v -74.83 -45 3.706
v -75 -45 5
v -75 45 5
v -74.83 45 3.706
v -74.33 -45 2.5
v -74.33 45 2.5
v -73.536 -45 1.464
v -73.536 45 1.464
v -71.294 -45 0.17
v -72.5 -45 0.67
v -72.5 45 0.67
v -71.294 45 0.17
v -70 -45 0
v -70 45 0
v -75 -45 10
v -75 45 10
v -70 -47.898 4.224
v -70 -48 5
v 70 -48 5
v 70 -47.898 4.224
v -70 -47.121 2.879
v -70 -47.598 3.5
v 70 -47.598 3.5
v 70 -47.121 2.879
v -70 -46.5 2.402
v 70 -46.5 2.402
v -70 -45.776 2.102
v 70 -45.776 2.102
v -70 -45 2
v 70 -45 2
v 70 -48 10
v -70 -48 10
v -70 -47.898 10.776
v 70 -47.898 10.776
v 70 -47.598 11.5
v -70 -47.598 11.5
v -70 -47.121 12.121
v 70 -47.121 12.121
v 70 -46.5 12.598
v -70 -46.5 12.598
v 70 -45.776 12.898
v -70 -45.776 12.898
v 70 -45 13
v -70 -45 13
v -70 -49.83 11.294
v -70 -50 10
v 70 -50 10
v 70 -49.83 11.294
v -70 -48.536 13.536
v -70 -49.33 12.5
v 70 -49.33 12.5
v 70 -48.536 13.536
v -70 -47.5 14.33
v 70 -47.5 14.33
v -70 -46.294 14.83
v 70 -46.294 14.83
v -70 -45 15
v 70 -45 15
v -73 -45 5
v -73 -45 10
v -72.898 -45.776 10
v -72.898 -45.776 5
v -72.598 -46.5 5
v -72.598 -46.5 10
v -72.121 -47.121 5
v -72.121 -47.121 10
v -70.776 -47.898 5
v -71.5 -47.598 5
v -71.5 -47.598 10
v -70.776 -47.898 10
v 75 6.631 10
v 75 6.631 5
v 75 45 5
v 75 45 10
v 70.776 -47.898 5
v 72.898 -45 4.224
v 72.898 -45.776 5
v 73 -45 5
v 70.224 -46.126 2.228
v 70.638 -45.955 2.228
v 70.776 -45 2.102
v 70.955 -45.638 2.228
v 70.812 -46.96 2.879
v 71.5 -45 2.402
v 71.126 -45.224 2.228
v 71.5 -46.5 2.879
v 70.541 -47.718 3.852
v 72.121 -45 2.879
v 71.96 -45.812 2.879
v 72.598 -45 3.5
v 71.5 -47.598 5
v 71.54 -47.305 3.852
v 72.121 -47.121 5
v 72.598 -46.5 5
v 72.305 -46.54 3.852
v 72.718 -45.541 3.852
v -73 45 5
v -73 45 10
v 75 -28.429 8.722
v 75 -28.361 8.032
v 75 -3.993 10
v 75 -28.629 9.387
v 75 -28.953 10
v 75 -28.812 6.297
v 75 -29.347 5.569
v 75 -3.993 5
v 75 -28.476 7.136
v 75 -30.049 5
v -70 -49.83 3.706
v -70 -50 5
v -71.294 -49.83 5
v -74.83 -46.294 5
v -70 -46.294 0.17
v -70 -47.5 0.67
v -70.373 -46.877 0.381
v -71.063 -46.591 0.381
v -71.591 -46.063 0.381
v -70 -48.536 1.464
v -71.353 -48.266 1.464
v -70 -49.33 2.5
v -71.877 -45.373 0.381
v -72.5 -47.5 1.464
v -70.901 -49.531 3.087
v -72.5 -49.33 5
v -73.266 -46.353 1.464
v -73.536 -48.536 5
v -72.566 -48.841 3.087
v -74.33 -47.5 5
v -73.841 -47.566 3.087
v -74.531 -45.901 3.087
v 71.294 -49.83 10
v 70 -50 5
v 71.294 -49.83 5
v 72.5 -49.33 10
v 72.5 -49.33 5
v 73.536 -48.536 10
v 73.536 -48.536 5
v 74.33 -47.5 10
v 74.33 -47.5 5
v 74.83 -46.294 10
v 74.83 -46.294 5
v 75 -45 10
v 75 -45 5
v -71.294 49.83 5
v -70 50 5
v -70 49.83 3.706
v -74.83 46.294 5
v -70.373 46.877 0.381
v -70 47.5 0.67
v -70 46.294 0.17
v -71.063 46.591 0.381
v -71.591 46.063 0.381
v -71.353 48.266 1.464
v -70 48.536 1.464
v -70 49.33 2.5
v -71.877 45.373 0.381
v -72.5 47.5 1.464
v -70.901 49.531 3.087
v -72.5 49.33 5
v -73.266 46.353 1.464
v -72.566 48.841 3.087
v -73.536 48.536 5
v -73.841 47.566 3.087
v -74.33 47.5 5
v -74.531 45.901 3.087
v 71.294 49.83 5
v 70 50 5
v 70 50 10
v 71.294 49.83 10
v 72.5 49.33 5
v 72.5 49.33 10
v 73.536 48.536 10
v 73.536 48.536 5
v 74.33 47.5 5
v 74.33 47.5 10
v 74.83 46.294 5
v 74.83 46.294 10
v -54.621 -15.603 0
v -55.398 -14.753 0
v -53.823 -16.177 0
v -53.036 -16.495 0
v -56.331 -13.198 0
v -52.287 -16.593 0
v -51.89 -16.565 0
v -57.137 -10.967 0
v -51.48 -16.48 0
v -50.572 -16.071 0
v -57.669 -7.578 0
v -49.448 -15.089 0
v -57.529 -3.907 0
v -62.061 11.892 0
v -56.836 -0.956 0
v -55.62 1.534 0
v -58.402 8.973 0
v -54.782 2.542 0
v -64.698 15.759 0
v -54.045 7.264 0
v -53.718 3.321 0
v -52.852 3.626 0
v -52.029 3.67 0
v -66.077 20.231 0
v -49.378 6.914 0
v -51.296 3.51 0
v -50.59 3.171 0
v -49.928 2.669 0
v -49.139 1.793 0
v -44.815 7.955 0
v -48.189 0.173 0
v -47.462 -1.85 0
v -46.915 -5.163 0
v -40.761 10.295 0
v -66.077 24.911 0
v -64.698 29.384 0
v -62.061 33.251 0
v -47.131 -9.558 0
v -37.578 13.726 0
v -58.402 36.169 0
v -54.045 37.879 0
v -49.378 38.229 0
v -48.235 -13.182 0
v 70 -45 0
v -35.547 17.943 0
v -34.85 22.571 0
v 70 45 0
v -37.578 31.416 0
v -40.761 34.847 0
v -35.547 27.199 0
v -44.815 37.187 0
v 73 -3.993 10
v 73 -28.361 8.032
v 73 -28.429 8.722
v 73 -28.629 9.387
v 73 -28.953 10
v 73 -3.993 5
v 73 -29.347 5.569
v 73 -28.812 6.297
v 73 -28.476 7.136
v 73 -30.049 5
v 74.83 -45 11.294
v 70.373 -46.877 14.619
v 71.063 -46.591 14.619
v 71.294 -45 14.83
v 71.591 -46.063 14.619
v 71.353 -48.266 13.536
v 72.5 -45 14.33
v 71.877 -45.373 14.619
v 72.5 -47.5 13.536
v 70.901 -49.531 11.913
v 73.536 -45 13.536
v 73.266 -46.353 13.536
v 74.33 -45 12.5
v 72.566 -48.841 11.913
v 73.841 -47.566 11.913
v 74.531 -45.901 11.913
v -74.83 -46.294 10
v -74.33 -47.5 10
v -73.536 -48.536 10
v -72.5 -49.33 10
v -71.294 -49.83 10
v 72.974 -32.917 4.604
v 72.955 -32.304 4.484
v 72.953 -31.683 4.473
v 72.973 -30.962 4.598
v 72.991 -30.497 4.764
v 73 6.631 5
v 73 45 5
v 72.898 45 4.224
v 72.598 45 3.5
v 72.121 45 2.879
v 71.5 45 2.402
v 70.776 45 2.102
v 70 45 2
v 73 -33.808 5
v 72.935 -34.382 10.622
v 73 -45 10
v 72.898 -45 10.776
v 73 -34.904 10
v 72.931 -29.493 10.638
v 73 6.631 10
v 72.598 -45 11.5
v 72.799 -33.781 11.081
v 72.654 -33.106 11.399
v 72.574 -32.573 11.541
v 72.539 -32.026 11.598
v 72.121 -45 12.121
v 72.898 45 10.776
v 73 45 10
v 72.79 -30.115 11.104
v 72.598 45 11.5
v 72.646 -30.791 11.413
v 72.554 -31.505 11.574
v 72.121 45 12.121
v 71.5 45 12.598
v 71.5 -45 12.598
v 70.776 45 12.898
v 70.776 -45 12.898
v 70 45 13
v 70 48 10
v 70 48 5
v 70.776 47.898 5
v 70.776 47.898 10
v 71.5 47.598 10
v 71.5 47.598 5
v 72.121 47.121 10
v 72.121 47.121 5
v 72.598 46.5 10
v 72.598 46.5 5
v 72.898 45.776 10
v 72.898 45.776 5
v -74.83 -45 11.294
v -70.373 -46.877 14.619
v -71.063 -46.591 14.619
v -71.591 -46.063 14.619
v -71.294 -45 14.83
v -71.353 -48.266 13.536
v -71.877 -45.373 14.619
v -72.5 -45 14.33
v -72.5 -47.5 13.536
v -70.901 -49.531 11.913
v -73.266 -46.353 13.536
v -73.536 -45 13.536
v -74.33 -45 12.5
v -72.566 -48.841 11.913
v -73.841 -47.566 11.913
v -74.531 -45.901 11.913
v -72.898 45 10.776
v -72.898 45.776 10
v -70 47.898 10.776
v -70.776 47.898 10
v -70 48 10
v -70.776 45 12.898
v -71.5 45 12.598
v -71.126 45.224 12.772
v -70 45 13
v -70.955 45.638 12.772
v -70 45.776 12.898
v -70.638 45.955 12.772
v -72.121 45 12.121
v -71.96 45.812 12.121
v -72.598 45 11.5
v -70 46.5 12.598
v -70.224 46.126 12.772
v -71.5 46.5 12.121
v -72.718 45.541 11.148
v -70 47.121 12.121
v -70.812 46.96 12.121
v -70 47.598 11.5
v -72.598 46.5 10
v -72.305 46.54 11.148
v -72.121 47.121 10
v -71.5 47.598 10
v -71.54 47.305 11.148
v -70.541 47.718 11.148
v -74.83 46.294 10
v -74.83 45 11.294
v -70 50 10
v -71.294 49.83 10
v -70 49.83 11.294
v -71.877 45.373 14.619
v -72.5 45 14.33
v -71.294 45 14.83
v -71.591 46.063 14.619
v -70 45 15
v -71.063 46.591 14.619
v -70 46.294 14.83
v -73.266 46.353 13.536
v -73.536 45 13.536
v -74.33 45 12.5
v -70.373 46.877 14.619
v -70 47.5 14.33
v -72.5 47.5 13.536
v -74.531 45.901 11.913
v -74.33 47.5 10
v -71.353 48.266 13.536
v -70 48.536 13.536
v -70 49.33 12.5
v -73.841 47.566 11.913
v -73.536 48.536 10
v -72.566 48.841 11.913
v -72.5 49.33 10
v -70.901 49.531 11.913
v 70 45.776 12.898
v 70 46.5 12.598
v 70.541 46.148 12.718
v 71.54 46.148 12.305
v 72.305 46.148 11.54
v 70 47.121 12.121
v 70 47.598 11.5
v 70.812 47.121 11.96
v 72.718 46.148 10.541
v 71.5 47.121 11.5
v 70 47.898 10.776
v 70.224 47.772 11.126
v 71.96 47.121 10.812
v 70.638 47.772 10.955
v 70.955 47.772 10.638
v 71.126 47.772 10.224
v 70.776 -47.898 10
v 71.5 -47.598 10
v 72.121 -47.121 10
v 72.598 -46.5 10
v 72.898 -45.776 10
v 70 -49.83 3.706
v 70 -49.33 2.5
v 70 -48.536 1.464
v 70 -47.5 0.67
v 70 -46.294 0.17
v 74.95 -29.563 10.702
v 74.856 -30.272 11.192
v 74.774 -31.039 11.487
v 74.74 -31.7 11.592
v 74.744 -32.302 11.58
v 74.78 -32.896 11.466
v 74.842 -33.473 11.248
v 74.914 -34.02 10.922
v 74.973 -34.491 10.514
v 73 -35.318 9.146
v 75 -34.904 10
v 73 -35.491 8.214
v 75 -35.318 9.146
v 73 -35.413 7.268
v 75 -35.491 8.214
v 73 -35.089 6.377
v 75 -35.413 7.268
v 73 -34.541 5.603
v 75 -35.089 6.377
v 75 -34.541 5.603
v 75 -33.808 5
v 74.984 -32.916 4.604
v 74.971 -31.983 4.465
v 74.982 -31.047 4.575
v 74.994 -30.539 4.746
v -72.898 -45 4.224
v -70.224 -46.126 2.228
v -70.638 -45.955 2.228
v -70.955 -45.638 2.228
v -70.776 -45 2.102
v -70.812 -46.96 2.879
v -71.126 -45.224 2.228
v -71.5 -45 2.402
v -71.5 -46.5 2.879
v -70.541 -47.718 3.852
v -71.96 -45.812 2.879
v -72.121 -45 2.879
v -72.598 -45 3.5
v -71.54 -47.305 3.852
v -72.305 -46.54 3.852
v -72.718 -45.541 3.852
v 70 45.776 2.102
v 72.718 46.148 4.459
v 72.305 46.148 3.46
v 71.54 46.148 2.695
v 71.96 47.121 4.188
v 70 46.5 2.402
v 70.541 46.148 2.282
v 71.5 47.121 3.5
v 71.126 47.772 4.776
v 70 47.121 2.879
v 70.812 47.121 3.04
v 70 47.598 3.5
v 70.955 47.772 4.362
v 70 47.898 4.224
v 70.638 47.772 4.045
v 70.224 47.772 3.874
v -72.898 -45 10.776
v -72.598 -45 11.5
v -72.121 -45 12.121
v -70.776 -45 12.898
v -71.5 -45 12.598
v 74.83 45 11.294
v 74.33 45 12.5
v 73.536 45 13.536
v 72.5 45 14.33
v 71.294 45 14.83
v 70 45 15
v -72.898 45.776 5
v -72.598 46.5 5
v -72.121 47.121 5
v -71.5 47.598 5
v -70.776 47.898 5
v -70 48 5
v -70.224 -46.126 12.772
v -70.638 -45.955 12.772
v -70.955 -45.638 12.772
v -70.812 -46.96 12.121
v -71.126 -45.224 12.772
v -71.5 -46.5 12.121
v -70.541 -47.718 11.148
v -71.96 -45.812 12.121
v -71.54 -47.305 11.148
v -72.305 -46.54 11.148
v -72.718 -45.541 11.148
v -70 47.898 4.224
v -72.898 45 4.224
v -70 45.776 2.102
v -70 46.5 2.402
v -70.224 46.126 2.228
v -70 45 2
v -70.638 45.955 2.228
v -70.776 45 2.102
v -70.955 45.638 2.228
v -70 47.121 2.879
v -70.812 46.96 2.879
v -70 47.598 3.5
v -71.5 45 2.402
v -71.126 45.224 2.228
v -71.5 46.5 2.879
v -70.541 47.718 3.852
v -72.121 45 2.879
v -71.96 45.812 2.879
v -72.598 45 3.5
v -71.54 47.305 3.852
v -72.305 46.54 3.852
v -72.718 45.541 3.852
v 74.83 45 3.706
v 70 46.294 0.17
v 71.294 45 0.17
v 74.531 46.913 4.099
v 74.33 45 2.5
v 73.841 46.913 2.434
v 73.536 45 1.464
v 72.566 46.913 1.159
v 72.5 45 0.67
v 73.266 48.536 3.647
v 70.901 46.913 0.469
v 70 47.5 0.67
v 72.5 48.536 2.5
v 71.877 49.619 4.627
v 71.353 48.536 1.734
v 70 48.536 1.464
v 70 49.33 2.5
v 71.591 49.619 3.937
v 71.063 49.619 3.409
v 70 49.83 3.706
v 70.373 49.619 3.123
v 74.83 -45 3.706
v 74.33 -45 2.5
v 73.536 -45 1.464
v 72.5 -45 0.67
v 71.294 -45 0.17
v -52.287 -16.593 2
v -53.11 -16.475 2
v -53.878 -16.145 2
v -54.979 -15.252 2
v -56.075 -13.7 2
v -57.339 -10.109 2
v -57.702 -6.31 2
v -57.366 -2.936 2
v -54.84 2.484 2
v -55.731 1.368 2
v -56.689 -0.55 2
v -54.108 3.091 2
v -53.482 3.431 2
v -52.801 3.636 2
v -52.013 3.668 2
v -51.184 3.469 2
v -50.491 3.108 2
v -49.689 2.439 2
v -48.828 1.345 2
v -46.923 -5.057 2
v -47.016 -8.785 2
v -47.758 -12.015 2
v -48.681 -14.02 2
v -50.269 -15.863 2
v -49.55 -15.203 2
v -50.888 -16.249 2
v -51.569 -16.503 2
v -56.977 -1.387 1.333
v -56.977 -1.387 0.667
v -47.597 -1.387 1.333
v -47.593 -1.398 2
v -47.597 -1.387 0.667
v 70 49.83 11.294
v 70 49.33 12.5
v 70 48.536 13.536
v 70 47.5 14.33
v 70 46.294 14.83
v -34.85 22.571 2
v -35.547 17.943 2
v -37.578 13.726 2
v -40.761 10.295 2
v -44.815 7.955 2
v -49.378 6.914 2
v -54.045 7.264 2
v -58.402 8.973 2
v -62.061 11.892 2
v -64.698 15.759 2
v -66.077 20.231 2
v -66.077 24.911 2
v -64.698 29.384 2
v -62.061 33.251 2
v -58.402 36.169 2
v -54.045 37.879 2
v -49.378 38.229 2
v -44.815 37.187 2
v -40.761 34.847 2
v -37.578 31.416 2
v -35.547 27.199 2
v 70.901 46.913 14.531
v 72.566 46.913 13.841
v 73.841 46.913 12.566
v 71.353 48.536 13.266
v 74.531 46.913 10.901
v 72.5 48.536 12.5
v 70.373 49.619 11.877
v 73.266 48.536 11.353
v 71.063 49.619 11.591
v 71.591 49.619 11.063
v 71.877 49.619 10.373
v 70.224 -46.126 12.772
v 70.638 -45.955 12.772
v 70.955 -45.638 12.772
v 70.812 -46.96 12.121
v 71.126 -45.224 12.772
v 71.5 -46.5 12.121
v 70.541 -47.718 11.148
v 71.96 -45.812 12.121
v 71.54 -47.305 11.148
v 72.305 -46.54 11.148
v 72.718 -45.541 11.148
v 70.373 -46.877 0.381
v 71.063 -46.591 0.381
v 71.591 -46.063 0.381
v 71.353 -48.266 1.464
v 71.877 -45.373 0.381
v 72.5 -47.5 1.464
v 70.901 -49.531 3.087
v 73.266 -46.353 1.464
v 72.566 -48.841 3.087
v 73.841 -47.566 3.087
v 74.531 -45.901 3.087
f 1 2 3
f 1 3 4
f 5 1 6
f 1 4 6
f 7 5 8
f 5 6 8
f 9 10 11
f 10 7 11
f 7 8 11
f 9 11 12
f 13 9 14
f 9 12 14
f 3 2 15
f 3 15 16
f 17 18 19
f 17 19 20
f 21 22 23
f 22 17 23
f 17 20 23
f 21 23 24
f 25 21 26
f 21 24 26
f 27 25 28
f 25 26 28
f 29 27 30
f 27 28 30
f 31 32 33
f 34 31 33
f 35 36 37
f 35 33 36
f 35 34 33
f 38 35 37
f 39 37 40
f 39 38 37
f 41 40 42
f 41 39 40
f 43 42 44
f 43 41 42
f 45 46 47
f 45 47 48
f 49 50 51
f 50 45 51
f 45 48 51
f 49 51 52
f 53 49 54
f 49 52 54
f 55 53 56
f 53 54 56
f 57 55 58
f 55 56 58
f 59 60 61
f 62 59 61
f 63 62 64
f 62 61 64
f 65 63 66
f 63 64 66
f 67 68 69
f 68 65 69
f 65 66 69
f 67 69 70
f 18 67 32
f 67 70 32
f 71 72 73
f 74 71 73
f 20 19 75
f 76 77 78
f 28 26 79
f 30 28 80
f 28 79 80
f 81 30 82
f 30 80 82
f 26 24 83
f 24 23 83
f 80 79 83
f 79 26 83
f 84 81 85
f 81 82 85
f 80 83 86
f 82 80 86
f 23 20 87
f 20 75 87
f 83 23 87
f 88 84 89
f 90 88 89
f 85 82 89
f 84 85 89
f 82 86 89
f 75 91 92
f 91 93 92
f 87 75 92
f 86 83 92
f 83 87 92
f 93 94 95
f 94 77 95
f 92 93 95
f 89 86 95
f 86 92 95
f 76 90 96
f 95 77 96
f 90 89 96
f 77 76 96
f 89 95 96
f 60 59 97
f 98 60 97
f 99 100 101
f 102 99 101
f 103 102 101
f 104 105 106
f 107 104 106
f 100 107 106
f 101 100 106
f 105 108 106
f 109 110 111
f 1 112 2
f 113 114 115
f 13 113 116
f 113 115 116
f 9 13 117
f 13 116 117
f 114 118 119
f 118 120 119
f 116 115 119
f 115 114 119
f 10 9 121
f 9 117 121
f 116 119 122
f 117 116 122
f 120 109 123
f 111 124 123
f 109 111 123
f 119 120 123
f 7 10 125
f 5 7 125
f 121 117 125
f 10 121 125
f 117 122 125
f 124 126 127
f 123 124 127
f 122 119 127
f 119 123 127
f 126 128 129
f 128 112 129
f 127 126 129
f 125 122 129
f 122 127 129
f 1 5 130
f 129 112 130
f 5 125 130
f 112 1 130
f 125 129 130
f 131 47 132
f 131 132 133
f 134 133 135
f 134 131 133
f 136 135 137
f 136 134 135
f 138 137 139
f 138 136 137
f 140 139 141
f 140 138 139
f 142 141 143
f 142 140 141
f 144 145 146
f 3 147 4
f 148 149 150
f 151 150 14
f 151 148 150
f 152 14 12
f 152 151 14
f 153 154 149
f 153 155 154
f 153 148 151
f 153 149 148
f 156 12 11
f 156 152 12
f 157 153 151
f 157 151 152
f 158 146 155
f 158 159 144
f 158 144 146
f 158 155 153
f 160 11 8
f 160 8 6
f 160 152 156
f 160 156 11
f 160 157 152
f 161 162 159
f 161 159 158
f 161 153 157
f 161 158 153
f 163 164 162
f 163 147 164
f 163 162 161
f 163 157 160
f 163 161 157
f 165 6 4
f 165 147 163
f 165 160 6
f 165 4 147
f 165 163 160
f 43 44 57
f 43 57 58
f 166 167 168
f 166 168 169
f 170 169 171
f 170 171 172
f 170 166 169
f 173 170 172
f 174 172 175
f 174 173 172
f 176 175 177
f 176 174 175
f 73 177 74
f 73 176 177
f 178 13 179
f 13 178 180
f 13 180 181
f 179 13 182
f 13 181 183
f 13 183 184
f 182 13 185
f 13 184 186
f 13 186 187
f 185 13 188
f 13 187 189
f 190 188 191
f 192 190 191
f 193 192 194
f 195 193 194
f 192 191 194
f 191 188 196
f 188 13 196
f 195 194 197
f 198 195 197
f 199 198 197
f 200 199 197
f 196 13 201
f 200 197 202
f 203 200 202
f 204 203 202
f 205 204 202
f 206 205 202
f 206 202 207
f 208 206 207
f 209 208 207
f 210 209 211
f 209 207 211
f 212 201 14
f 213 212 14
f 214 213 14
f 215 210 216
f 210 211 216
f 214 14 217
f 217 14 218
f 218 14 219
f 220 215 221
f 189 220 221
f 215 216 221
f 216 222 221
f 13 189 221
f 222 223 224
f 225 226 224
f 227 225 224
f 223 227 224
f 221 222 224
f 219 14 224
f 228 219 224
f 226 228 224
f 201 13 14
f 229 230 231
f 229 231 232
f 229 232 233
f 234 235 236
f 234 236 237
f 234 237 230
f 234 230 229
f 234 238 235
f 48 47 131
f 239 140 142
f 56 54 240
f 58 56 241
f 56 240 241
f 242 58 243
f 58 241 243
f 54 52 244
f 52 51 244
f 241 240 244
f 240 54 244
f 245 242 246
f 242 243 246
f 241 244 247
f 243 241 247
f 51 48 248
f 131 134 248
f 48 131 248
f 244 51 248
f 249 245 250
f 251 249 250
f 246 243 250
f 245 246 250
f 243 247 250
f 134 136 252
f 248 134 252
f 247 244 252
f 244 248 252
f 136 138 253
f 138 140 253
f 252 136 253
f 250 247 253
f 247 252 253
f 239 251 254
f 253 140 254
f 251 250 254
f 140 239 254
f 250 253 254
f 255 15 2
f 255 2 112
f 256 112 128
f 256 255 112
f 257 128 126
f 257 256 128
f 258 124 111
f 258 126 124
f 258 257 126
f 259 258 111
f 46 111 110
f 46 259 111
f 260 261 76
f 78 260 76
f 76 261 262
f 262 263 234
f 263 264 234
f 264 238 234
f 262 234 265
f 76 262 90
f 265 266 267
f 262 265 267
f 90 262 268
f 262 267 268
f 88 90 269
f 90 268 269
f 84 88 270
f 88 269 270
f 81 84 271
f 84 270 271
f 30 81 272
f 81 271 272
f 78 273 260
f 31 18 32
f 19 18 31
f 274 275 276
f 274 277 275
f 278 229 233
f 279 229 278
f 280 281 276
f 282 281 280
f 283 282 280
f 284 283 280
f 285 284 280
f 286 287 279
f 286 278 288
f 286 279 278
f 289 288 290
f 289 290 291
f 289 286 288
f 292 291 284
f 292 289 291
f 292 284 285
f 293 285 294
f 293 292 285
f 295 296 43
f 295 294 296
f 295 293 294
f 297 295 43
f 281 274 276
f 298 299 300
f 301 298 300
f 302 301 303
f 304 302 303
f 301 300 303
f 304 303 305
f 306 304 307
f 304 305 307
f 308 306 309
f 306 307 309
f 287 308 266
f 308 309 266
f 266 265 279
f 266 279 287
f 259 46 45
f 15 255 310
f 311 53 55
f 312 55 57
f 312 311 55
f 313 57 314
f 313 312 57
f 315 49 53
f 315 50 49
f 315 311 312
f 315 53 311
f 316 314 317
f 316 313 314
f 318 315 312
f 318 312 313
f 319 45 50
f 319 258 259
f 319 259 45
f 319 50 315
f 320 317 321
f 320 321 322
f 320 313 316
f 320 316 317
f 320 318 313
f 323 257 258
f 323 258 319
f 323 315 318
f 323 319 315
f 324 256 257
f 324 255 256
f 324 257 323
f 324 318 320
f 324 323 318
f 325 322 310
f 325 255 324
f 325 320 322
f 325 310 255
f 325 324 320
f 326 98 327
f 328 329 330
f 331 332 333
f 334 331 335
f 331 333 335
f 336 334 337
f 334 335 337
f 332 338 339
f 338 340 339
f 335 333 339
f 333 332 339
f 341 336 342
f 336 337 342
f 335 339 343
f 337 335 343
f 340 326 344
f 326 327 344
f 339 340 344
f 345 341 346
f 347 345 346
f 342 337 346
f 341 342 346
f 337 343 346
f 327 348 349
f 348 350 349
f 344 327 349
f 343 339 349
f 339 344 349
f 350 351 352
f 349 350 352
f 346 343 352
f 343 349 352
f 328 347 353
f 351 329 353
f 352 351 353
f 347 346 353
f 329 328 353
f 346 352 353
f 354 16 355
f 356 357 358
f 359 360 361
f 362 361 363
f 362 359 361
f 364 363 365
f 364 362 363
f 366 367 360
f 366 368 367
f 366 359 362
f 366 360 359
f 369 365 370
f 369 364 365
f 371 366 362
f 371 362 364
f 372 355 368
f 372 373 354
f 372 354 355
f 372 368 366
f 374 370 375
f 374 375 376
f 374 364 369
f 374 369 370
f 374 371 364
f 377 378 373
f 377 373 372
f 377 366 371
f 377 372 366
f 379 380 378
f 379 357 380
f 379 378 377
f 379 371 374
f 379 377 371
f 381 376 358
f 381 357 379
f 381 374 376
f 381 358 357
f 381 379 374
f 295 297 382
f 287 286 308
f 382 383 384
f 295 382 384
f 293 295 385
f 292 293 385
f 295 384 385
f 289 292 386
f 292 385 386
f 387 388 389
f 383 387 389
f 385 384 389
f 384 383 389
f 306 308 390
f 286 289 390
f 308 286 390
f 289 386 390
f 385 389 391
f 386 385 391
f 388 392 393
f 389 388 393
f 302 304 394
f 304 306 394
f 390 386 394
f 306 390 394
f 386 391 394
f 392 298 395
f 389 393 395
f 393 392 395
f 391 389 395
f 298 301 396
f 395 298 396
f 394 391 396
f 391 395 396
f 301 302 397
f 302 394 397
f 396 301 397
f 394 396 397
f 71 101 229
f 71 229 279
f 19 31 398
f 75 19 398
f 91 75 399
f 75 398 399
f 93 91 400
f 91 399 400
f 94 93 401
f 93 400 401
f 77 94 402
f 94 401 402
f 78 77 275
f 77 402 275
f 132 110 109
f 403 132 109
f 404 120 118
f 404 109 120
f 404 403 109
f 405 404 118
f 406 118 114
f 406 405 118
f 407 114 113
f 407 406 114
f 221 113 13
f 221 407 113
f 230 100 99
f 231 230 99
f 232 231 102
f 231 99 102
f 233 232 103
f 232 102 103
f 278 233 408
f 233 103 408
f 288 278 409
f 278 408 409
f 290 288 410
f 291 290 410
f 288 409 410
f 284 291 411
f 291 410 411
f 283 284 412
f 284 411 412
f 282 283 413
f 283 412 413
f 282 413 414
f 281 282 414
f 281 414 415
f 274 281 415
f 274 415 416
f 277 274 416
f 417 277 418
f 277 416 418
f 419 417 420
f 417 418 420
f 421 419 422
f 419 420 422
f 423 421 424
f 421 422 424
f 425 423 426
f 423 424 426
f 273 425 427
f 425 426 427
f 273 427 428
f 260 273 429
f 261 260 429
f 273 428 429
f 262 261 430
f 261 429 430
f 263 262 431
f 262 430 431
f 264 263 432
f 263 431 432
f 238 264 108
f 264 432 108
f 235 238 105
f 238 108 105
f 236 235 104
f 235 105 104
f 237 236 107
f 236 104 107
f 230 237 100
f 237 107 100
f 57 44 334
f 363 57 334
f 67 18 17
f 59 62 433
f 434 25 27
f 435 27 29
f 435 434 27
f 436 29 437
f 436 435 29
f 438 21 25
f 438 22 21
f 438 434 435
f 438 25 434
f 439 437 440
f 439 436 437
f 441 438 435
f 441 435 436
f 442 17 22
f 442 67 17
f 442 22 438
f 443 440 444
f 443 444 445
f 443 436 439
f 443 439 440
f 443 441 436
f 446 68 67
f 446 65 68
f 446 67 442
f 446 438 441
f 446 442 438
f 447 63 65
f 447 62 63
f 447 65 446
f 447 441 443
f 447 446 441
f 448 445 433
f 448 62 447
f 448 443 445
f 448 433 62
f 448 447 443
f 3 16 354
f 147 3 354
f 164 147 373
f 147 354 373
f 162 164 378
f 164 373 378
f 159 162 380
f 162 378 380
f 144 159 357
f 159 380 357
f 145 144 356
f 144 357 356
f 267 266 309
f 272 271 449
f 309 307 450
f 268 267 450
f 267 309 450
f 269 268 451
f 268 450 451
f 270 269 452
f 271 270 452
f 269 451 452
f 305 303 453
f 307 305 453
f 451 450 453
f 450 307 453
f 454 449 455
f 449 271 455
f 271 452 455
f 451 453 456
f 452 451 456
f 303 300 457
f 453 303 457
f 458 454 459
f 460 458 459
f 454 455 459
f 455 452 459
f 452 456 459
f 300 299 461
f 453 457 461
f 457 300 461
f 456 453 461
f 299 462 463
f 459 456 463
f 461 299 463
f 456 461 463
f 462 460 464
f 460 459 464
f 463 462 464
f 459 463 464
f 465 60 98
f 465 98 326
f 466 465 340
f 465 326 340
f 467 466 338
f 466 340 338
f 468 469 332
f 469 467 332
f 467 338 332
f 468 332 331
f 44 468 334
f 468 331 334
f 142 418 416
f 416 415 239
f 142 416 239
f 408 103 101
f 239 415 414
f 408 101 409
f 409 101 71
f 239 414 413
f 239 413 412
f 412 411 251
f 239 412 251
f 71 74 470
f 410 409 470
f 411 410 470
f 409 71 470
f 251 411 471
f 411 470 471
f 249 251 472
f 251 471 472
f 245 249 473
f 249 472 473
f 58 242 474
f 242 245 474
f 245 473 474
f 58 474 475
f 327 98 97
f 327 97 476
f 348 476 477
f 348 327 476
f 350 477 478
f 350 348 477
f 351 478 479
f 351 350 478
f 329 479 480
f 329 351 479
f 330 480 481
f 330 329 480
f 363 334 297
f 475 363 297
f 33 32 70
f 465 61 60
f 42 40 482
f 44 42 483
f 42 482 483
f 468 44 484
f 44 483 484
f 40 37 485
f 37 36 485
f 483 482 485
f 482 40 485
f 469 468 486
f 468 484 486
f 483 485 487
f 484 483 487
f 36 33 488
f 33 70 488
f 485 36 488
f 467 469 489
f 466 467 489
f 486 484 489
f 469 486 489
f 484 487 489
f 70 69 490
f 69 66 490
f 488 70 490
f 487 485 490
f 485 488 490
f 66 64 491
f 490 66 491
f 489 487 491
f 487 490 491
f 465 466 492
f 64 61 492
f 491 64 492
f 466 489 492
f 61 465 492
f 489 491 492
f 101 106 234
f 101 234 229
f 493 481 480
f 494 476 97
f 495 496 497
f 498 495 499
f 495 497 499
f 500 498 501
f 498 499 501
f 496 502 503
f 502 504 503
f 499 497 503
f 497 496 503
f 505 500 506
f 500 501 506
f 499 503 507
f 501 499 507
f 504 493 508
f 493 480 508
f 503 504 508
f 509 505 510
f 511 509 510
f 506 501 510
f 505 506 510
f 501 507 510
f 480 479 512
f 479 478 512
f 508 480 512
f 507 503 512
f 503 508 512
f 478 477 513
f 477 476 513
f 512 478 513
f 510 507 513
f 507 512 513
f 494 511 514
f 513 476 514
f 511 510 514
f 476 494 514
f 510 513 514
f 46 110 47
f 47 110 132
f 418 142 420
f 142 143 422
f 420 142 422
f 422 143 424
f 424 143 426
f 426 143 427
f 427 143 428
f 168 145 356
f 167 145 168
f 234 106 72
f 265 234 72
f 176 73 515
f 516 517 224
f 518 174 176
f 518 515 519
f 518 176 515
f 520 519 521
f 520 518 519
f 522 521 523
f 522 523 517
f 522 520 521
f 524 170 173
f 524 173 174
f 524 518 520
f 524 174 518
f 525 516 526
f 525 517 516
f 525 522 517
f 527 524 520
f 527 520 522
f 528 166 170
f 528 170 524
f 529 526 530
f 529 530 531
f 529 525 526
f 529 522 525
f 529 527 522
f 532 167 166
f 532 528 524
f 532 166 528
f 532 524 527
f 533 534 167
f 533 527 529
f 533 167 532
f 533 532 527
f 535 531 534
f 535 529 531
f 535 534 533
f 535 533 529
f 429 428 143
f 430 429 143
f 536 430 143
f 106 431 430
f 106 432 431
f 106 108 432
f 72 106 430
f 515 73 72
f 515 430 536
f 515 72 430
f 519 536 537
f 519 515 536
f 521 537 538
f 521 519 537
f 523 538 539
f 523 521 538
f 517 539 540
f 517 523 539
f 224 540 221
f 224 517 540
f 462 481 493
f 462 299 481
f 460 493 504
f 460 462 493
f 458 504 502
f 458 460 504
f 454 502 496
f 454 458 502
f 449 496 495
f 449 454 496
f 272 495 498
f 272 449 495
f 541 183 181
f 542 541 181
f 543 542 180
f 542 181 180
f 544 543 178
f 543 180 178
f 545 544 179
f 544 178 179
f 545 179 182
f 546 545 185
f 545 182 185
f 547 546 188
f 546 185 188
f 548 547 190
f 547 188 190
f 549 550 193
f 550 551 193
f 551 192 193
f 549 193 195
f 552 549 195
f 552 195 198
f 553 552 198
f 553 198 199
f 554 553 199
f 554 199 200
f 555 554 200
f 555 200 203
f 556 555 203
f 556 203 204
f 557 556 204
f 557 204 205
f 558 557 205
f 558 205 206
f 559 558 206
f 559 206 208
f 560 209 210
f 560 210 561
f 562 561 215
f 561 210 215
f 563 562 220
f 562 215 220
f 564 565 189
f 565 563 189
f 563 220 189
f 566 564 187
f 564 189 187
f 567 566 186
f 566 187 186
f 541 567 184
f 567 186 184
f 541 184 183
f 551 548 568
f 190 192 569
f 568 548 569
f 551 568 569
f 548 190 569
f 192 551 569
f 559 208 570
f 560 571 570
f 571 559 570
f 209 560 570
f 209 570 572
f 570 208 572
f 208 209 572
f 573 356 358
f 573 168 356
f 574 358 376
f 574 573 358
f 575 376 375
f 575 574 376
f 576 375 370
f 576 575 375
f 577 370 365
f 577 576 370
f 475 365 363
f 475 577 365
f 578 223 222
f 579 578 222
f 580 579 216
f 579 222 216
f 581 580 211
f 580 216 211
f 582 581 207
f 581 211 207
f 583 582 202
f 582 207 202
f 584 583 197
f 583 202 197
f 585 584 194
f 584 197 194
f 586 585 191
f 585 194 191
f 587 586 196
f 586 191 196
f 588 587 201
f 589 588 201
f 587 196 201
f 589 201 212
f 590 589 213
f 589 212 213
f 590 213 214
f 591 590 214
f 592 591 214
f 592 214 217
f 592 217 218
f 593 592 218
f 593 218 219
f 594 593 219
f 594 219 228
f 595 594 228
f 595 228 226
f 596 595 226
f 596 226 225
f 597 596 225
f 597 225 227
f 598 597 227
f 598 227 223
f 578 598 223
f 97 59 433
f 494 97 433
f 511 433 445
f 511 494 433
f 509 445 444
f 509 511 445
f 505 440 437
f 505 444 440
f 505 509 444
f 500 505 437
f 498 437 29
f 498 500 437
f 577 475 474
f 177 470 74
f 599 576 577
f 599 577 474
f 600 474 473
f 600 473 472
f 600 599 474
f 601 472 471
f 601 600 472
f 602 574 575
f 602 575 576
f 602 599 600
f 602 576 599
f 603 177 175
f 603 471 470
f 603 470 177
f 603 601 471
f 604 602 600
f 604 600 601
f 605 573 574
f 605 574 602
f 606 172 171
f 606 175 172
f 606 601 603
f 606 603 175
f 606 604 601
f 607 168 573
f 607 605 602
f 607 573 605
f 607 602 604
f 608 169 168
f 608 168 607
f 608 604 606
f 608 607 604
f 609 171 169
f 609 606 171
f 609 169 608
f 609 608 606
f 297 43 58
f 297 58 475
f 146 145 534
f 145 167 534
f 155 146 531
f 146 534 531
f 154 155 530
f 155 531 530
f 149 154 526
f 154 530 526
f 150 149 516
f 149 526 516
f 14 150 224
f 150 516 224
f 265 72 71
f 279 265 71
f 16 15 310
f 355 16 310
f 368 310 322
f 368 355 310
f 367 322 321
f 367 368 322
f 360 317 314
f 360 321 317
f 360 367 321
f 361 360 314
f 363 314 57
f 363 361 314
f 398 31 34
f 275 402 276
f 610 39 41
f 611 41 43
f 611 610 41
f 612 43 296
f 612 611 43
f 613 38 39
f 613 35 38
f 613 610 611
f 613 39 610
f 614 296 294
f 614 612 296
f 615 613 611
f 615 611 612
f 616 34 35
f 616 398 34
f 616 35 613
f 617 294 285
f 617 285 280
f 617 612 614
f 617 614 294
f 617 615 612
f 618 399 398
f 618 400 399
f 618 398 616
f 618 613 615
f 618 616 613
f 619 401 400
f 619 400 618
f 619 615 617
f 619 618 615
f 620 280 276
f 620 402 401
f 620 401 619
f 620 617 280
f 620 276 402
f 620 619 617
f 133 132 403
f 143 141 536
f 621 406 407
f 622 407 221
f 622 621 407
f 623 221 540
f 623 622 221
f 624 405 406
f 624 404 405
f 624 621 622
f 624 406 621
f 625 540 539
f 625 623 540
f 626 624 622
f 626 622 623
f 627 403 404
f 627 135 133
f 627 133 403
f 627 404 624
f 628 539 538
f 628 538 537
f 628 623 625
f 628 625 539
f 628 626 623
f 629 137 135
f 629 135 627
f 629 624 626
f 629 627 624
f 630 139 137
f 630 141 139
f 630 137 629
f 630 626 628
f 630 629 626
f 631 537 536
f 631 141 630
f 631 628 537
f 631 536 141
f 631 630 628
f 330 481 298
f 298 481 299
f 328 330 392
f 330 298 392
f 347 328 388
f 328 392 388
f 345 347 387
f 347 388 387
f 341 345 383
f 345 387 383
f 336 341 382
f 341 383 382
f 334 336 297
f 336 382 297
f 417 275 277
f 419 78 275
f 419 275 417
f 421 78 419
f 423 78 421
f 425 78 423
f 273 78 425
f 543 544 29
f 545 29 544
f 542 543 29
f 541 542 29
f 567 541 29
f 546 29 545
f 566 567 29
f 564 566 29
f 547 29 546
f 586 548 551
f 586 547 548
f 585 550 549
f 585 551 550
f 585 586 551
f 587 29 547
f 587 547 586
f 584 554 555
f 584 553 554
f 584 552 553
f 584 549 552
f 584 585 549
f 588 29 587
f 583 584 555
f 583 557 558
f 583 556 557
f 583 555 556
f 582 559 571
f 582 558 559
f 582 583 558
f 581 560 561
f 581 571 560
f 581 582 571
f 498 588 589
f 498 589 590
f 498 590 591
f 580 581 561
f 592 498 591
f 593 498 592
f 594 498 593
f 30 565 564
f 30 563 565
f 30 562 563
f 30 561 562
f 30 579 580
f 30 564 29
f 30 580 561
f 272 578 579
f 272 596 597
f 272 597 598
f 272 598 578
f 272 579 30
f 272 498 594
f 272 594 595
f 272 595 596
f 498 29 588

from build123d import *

# Parameters (mm, degrees)
F0_W         = 150
F0_H         = 100
F1_DEPTH     = 15
F2_R         = 5
F3_T1_DEPTH  = 5
F3_S5_W      = 5
F3_S5_H      = 5
F3_T6_DEPTH  = 5
F3_S11_W     = 5
F3_S11_H     = 5
F3_T12_DEPTH = 5
F4_T         = -2
F6_R         = 15.7014328103
F7_DEPTH     = 25
F8_W         = 10.624602437
F8_H         = 5
F8_R         = 3.5673659444
F9_DEPTH     = 25


# Not quite as in the source:
# - a fillet or chamfer that OpenCascade refuses, or shapes differently, is made with other operations: its cross-section is extruded or revolved along the edge and cut away or added
# - a shell that OpenCascade refuses in one call is made with other operations: the cavity is built on its own and cut out


with BuildPart() as f1:
    # F0 (on Top) → F1 (new body)
    with BuildSketch(Plane.XY):
        Rectangle(F0_W, F0_H)
    extrude(amount=F1_DEPTH)

    # F2
    f2_edges = [f1.edges().sort_by_distance(p)[0] for p in [
        (-75, 50, 7.5),
        (-75, -50, 7.5),
        (75, -50, 7.5),
        (0, 50, 0),
        (0, -50, 0),
        (0, -50, 15),
        (-75, 0, 0),
        (-75, 0, 15),
        (75, 0, 0),
        (0, 50, 15),
        (75, 0, 15),
    ]]
    fillet(f2_edges, radius=F2_R)

    # F3: fillet of radius 5 on 1 edges, made by hand

    # F3_s2 → F3_t1 (cut)
    with BuildSketch(Plane.XY.offset(5)):
        with BuildLine():
            ThreePointArc((70, 50), (73.5355339059, 48.5355339059), (75, 45))
            Line((75, 45), (75, 50))
            Line((75, 50), (70, 50))
        make_face()
    extrude(amount=F3_T1_DEPTH, mode=Mode.SUBTRACT)


with BuildPart() as f3_tool4:
    # F3_s5 → F3_t6 (new body)
    with BuildSketch(Plane.XZ.offset(-45)):
        with Locations((72.5, 2.5)):
            Rectangle(F3_S5_W, F3_S5_H)
    extrude(amount=-F3_T6_DEPTH)

    # F3_s7 → F3_t8 (revolve, cut)
    with BuildSketch(Plane(origin=(70, 45, 5), x_dir=(-0.7071067812, 0, 0.7071067812), z_dir=(-0.7071067812, 0, -0.7071067812))):
        with BuildLine():
            ThreePointArc((0, -5), (5, 0), (0, 5))
            Line((0, 5), (0, -5))
        make_face()
    revolve(axis=Axis((70, 45, 5), (0, 1, 0)), mode=Mode.SUBTRACT)


with BuildPart() as f1_1:
    add(f1.part)

    # F3_t3: cut F3_tool4
    add(f3_tool4.part, mode=Mode.SUBTRACT)


with BuildPart() as f3_tool10:
    # F3_s11 → F3_t12 (new body)
    with BuildSketch(Plane.XZ.offset(-45)):
        with Locations((72.5, 12.5)):
            Rectangle(F3_S11_W, F3_S11_H)
    extrude(amount=-F3_T12_DEPTH)

    # F3_s13 → F3_t14 (revolve, cut)
    with BuildSketch(Plane(origin=(70, 45, 10), x_dir=(-0.7071067812, 0, -0.7071067812), z_dir=(0.7071067812, 0, -0.7071067812))):
        with BuildLine():
            ThreePointArc((0, -5), (5, 0), (0, 5))
            Line((0, 5), (0, -5))
        make_face()
    revolve(axis=Axis((70, 45, 10), (0, 1, 0)), mode=Mode.SUBTRACT)


with BuildPart() as f1_2:
    add(f1_1.part)

    # F3_t9: cut F3_tool10
    add(f3_tool10.part, mode=Mode.SUBTRACT)

    # F4: a shell. OpenCascade refuses it in one call, so the cavity is built on its own and cut out:
    # the body offset inwards by the wall thickness, plus a prism from it out through each open face.
    f4_core = offset(f1_2.part, amount=F4_T, mode=Mode.PRIVATE)
    f4_exits = [f4_core.faces().sort_by_distance(p)[0] for p in [
        (0, 0, 13),
    ]]
    add(f4_core, mode=Mode.SUBTRACT)
    extrude(f4_exits, amount=-F4_T, mode=Mode.SUBTRACT)

    # F6 (on face) → F7 (cut)
    with BuildSketch(Plane(origin=(0, 0, 0), x_dir=(1, 0, 0), z_dir=(0, 0, -1))):
        with Locations((-50.5510754883, -22.5712861866)):
            Circle(F6_R)
        with BuildLine():
            add(Edge.make_bspline(
                [(-52.28683725, 16.5926627815), (-61.667239248, 16.5926627815), (-56.977038249, 1.3871968258), (-52.28683725, -13.8182691298), (-47.596636251, 1.3871968258), (-42.906435252, 16.5926627815), (-52.28683725, 16.5926627815)],
                knots=[0, 0, 0, 2.0943951024, 2.0943951024, 4.1887902048, 4.1887902048, 6.2831853072, 6.2831853072, 6.2831853072], degree=2, weights=[1, 0.5, 1, 0.5, 1, 0.5, 1]))
        make_face()
    extrude(amount=-F7_DEPTH, mode=Mode.SUBTRACT)

    # F8 (on face) → F9 (cut)
    with BuildSketch(Plane.YZ.offset(75)):
        with Locations((1.3190158643, 7.5)):
            Rectangle(F8_W, F8_H)
        with Locations((-31.9286696613, 8.0319177359)):
            Circle(F8_R)
    extrude(amount=-F9_DEPTH, mode=Mode.SUBTRACT)


solid = f1_2.part
